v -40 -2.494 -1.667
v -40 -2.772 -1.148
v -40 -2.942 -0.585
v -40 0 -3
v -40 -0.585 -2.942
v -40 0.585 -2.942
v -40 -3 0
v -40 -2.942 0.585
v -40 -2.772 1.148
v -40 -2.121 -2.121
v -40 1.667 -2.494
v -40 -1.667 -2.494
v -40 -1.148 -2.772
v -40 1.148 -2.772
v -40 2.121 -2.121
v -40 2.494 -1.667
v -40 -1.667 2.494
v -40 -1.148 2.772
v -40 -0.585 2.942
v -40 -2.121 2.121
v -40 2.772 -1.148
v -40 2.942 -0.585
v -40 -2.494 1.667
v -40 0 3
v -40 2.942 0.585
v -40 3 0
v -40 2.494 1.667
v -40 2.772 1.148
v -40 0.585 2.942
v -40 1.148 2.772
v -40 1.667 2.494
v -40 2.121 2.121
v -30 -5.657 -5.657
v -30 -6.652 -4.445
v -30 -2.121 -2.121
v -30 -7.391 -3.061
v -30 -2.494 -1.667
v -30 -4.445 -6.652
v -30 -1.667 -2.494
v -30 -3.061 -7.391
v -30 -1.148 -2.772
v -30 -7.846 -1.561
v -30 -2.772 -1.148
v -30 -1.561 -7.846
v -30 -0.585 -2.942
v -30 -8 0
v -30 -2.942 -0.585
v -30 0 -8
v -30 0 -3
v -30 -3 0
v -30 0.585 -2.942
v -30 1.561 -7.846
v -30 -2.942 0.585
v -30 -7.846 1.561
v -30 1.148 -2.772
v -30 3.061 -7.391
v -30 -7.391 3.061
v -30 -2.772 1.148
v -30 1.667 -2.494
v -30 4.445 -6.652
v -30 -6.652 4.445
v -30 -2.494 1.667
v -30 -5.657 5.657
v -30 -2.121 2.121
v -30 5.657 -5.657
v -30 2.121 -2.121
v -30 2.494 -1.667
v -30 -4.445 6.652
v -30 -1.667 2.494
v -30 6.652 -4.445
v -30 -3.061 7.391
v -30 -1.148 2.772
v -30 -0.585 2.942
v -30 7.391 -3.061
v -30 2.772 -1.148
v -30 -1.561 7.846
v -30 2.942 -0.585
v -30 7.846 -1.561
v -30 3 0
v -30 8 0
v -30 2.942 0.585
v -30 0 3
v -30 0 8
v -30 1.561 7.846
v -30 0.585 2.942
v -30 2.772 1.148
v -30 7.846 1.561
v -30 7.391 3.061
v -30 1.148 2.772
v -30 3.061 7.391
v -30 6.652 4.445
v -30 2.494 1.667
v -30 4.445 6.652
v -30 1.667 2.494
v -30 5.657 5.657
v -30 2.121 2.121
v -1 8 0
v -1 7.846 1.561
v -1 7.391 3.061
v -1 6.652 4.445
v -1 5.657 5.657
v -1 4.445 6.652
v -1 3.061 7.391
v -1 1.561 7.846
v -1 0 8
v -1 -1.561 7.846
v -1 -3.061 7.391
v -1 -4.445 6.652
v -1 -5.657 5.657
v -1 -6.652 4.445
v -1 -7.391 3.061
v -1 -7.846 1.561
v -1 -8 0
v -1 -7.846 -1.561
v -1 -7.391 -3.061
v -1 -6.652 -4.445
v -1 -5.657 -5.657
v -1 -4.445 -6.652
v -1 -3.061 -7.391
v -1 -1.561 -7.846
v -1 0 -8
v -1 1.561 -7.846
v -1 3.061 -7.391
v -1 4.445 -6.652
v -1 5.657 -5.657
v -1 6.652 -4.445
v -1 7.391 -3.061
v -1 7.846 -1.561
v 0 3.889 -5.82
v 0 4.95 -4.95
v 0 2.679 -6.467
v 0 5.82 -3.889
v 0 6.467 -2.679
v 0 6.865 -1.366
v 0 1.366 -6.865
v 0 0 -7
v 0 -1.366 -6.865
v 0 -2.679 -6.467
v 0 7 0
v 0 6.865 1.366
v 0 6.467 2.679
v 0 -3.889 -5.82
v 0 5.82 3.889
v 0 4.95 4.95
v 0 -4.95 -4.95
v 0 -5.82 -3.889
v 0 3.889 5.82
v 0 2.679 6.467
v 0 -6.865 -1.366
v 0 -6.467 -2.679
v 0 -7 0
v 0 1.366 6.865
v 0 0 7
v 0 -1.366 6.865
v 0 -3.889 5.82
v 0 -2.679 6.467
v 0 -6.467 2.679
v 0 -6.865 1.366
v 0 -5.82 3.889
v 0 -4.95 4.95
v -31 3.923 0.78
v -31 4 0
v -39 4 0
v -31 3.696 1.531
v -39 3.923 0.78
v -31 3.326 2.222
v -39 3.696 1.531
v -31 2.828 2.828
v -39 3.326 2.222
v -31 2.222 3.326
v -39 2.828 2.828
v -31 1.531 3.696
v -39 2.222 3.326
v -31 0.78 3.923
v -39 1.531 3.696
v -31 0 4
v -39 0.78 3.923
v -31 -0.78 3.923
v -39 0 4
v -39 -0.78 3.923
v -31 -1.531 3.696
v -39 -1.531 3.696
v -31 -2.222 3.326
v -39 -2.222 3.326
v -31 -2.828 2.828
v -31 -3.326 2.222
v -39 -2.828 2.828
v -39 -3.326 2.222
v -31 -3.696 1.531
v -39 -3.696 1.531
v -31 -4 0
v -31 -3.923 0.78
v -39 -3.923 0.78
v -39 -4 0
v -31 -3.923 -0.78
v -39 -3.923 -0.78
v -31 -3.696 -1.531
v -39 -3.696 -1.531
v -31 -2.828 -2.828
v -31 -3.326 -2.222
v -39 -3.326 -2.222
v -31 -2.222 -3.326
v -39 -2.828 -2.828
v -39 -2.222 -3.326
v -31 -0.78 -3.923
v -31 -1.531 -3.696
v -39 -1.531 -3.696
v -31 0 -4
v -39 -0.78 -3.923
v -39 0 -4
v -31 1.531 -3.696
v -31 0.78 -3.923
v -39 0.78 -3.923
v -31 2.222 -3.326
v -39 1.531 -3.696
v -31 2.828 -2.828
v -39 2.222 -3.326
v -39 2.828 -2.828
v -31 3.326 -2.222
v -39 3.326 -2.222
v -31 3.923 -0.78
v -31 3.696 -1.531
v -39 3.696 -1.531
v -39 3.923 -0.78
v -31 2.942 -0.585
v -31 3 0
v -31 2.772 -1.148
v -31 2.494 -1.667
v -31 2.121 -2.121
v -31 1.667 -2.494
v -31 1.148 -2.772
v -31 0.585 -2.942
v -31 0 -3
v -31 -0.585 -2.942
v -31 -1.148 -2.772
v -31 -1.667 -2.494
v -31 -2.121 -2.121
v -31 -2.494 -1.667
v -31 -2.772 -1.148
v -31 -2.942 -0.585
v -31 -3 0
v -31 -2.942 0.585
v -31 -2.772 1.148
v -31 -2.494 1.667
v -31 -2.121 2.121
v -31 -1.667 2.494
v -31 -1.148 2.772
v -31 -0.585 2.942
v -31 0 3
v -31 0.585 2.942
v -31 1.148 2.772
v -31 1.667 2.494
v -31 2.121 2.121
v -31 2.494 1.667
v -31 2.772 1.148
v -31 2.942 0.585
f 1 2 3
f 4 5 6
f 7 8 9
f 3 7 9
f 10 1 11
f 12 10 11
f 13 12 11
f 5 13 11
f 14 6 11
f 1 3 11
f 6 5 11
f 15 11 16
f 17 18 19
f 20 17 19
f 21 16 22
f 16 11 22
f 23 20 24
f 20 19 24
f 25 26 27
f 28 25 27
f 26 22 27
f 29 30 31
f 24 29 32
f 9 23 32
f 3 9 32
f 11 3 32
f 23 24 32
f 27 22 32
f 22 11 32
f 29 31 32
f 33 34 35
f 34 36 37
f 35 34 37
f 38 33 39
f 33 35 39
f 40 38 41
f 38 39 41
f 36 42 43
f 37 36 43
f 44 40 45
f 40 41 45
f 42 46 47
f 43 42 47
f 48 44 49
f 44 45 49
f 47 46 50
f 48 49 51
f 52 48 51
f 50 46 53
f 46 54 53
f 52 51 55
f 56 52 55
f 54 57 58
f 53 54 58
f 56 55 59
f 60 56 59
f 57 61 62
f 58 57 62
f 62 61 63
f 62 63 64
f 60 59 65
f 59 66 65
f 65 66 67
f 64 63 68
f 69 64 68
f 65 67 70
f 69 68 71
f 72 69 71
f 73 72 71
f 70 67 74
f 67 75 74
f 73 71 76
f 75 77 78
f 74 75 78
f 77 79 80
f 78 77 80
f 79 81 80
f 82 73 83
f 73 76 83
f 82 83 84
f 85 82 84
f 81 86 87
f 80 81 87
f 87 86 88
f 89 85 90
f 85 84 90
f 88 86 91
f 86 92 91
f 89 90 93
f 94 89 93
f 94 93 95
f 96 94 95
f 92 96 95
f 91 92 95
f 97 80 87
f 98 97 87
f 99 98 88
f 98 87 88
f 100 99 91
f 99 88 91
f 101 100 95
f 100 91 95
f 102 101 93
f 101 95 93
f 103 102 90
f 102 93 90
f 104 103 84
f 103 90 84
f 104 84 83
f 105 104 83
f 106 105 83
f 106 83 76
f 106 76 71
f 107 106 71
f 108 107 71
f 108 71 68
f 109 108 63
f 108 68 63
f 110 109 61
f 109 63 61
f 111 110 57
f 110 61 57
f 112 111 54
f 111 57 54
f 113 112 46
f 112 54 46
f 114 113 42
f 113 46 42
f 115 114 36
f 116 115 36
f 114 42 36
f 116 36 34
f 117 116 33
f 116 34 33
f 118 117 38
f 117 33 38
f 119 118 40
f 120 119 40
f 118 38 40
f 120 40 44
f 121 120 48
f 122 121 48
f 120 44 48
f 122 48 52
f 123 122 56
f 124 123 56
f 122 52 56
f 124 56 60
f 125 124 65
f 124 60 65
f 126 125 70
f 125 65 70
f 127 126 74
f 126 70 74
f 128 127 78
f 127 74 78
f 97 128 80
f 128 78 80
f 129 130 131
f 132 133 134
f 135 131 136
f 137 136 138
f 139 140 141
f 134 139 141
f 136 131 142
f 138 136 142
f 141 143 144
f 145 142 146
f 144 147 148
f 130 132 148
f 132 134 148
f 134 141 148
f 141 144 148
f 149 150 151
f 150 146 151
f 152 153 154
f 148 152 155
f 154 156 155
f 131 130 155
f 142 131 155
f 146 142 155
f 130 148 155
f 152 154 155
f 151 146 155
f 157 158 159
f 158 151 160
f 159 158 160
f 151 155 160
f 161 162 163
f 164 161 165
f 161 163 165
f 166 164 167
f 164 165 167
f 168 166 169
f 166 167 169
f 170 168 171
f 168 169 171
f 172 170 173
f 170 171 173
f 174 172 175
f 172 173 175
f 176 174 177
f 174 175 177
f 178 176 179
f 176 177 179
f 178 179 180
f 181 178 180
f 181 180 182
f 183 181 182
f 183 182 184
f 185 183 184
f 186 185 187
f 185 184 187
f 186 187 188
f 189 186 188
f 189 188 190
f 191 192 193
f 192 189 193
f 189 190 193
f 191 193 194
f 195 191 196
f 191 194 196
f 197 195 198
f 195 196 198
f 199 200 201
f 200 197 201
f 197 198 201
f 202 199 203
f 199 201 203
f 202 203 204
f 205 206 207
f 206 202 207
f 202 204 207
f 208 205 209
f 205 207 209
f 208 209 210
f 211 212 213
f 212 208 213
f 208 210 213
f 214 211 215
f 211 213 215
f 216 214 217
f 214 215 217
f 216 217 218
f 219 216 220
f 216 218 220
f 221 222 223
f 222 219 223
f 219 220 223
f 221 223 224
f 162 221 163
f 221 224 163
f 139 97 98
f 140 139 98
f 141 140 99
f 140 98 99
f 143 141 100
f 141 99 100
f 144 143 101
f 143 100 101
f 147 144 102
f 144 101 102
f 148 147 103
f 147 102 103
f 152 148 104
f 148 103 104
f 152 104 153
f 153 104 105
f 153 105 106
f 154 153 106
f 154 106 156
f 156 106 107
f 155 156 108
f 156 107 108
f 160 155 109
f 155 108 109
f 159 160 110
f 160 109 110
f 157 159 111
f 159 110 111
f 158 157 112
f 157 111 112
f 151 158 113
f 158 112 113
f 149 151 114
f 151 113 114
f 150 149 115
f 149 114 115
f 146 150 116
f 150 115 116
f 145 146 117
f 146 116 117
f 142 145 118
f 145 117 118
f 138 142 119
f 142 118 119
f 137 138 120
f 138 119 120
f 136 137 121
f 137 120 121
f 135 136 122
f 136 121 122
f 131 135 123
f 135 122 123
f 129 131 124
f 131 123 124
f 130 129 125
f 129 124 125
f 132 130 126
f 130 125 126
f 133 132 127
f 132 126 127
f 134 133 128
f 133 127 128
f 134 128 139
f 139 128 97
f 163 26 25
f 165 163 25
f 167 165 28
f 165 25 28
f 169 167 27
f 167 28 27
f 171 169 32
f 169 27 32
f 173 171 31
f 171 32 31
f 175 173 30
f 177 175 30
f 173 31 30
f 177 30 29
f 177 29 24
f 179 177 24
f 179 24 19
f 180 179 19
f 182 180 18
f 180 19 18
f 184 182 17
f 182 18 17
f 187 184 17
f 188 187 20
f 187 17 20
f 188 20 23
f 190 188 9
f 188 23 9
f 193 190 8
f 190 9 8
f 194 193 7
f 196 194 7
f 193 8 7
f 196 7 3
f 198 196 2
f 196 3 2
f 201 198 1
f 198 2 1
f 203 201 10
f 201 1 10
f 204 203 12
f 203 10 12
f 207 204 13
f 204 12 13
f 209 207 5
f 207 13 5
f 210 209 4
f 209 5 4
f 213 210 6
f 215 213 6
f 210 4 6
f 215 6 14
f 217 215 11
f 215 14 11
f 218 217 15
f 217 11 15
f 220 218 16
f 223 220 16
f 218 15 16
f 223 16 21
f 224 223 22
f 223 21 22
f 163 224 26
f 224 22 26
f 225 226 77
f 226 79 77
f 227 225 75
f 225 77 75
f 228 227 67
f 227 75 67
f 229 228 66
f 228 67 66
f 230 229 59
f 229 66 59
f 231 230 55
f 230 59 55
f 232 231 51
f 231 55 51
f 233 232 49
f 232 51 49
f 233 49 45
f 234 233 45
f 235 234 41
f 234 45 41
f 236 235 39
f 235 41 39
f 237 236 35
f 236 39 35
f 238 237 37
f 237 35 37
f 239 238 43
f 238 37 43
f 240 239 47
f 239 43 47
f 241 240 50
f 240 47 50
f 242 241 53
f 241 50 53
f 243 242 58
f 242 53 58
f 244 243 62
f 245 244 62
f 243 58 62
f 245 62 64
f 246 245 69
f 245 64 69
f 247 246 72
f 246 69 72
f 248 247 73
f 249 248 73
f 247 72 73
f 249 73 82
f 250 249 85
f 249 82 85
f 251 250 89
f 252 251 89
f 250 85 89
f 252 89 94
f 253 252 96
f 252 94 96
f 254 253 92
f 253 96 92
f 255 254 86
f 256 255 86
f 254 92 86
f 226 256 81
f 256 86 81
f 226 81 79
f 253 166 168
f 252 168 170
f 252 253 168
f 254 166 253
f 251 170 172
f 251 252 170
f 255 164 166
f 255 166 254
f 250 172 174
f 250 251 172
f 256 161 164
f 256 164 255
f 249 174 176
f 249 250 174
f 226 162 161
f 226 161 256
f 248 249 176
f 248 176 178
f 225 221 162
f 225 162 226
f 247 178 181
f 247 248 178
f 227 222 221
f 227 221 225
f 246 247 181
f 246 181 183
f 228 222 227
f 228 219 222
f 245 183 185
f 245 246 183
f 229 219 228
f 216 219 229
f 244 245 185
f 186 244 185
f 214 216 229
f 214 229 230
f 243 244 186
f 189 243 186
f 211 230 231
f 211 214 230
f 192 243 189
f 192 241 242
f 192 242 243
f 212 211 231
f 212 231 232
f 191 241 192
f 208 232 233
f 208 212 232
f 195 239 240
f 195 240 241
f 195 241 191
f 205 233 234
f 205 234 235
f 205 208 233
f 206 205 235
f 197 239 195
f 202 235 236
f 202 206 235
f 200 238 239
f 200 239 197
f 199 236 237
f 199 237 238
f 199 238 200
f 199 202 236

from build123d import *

# Parameters (mm, degrees)
CHAMFER1_SIZE = 1
SKETCH2_W     = 1
SKETCH2_H     = 1


with BuildPart() as part:
    # Sketch1 → Revolve1 (revolve)
    with BuildSketch(Plane.XY):
        Polygon((0, 0), (0, 8), (-30, 8), (-30, 4), (-40, 4), (-40, 0), align=None)
    revolve(axis=Axis((-114.784060064, 0, 0), (1, 0, 0)))

    # Chamfer1
    chamfer1_edges = [part.edges().sort_by_distance(p)[0] for p in [
        (-40, -4, 0),
        (0, -8, 0),
    ]]
    chamfer(chamfer1_edges, length=CHAMFER1_SIZE)

    # Sketch2 → Cut-Revolve1 (revolve, cut)
    with BuildSketch(Plane.XY):
        with Locations((-30.5, 3.5)):
            Rectangle(SKETCH2_W, SKETCH2_H)
    revolve(axis=Axis((0, 0, 0), (-1, 0, 0)), mode=Mode.SUBTRACT)


solid = part.part
